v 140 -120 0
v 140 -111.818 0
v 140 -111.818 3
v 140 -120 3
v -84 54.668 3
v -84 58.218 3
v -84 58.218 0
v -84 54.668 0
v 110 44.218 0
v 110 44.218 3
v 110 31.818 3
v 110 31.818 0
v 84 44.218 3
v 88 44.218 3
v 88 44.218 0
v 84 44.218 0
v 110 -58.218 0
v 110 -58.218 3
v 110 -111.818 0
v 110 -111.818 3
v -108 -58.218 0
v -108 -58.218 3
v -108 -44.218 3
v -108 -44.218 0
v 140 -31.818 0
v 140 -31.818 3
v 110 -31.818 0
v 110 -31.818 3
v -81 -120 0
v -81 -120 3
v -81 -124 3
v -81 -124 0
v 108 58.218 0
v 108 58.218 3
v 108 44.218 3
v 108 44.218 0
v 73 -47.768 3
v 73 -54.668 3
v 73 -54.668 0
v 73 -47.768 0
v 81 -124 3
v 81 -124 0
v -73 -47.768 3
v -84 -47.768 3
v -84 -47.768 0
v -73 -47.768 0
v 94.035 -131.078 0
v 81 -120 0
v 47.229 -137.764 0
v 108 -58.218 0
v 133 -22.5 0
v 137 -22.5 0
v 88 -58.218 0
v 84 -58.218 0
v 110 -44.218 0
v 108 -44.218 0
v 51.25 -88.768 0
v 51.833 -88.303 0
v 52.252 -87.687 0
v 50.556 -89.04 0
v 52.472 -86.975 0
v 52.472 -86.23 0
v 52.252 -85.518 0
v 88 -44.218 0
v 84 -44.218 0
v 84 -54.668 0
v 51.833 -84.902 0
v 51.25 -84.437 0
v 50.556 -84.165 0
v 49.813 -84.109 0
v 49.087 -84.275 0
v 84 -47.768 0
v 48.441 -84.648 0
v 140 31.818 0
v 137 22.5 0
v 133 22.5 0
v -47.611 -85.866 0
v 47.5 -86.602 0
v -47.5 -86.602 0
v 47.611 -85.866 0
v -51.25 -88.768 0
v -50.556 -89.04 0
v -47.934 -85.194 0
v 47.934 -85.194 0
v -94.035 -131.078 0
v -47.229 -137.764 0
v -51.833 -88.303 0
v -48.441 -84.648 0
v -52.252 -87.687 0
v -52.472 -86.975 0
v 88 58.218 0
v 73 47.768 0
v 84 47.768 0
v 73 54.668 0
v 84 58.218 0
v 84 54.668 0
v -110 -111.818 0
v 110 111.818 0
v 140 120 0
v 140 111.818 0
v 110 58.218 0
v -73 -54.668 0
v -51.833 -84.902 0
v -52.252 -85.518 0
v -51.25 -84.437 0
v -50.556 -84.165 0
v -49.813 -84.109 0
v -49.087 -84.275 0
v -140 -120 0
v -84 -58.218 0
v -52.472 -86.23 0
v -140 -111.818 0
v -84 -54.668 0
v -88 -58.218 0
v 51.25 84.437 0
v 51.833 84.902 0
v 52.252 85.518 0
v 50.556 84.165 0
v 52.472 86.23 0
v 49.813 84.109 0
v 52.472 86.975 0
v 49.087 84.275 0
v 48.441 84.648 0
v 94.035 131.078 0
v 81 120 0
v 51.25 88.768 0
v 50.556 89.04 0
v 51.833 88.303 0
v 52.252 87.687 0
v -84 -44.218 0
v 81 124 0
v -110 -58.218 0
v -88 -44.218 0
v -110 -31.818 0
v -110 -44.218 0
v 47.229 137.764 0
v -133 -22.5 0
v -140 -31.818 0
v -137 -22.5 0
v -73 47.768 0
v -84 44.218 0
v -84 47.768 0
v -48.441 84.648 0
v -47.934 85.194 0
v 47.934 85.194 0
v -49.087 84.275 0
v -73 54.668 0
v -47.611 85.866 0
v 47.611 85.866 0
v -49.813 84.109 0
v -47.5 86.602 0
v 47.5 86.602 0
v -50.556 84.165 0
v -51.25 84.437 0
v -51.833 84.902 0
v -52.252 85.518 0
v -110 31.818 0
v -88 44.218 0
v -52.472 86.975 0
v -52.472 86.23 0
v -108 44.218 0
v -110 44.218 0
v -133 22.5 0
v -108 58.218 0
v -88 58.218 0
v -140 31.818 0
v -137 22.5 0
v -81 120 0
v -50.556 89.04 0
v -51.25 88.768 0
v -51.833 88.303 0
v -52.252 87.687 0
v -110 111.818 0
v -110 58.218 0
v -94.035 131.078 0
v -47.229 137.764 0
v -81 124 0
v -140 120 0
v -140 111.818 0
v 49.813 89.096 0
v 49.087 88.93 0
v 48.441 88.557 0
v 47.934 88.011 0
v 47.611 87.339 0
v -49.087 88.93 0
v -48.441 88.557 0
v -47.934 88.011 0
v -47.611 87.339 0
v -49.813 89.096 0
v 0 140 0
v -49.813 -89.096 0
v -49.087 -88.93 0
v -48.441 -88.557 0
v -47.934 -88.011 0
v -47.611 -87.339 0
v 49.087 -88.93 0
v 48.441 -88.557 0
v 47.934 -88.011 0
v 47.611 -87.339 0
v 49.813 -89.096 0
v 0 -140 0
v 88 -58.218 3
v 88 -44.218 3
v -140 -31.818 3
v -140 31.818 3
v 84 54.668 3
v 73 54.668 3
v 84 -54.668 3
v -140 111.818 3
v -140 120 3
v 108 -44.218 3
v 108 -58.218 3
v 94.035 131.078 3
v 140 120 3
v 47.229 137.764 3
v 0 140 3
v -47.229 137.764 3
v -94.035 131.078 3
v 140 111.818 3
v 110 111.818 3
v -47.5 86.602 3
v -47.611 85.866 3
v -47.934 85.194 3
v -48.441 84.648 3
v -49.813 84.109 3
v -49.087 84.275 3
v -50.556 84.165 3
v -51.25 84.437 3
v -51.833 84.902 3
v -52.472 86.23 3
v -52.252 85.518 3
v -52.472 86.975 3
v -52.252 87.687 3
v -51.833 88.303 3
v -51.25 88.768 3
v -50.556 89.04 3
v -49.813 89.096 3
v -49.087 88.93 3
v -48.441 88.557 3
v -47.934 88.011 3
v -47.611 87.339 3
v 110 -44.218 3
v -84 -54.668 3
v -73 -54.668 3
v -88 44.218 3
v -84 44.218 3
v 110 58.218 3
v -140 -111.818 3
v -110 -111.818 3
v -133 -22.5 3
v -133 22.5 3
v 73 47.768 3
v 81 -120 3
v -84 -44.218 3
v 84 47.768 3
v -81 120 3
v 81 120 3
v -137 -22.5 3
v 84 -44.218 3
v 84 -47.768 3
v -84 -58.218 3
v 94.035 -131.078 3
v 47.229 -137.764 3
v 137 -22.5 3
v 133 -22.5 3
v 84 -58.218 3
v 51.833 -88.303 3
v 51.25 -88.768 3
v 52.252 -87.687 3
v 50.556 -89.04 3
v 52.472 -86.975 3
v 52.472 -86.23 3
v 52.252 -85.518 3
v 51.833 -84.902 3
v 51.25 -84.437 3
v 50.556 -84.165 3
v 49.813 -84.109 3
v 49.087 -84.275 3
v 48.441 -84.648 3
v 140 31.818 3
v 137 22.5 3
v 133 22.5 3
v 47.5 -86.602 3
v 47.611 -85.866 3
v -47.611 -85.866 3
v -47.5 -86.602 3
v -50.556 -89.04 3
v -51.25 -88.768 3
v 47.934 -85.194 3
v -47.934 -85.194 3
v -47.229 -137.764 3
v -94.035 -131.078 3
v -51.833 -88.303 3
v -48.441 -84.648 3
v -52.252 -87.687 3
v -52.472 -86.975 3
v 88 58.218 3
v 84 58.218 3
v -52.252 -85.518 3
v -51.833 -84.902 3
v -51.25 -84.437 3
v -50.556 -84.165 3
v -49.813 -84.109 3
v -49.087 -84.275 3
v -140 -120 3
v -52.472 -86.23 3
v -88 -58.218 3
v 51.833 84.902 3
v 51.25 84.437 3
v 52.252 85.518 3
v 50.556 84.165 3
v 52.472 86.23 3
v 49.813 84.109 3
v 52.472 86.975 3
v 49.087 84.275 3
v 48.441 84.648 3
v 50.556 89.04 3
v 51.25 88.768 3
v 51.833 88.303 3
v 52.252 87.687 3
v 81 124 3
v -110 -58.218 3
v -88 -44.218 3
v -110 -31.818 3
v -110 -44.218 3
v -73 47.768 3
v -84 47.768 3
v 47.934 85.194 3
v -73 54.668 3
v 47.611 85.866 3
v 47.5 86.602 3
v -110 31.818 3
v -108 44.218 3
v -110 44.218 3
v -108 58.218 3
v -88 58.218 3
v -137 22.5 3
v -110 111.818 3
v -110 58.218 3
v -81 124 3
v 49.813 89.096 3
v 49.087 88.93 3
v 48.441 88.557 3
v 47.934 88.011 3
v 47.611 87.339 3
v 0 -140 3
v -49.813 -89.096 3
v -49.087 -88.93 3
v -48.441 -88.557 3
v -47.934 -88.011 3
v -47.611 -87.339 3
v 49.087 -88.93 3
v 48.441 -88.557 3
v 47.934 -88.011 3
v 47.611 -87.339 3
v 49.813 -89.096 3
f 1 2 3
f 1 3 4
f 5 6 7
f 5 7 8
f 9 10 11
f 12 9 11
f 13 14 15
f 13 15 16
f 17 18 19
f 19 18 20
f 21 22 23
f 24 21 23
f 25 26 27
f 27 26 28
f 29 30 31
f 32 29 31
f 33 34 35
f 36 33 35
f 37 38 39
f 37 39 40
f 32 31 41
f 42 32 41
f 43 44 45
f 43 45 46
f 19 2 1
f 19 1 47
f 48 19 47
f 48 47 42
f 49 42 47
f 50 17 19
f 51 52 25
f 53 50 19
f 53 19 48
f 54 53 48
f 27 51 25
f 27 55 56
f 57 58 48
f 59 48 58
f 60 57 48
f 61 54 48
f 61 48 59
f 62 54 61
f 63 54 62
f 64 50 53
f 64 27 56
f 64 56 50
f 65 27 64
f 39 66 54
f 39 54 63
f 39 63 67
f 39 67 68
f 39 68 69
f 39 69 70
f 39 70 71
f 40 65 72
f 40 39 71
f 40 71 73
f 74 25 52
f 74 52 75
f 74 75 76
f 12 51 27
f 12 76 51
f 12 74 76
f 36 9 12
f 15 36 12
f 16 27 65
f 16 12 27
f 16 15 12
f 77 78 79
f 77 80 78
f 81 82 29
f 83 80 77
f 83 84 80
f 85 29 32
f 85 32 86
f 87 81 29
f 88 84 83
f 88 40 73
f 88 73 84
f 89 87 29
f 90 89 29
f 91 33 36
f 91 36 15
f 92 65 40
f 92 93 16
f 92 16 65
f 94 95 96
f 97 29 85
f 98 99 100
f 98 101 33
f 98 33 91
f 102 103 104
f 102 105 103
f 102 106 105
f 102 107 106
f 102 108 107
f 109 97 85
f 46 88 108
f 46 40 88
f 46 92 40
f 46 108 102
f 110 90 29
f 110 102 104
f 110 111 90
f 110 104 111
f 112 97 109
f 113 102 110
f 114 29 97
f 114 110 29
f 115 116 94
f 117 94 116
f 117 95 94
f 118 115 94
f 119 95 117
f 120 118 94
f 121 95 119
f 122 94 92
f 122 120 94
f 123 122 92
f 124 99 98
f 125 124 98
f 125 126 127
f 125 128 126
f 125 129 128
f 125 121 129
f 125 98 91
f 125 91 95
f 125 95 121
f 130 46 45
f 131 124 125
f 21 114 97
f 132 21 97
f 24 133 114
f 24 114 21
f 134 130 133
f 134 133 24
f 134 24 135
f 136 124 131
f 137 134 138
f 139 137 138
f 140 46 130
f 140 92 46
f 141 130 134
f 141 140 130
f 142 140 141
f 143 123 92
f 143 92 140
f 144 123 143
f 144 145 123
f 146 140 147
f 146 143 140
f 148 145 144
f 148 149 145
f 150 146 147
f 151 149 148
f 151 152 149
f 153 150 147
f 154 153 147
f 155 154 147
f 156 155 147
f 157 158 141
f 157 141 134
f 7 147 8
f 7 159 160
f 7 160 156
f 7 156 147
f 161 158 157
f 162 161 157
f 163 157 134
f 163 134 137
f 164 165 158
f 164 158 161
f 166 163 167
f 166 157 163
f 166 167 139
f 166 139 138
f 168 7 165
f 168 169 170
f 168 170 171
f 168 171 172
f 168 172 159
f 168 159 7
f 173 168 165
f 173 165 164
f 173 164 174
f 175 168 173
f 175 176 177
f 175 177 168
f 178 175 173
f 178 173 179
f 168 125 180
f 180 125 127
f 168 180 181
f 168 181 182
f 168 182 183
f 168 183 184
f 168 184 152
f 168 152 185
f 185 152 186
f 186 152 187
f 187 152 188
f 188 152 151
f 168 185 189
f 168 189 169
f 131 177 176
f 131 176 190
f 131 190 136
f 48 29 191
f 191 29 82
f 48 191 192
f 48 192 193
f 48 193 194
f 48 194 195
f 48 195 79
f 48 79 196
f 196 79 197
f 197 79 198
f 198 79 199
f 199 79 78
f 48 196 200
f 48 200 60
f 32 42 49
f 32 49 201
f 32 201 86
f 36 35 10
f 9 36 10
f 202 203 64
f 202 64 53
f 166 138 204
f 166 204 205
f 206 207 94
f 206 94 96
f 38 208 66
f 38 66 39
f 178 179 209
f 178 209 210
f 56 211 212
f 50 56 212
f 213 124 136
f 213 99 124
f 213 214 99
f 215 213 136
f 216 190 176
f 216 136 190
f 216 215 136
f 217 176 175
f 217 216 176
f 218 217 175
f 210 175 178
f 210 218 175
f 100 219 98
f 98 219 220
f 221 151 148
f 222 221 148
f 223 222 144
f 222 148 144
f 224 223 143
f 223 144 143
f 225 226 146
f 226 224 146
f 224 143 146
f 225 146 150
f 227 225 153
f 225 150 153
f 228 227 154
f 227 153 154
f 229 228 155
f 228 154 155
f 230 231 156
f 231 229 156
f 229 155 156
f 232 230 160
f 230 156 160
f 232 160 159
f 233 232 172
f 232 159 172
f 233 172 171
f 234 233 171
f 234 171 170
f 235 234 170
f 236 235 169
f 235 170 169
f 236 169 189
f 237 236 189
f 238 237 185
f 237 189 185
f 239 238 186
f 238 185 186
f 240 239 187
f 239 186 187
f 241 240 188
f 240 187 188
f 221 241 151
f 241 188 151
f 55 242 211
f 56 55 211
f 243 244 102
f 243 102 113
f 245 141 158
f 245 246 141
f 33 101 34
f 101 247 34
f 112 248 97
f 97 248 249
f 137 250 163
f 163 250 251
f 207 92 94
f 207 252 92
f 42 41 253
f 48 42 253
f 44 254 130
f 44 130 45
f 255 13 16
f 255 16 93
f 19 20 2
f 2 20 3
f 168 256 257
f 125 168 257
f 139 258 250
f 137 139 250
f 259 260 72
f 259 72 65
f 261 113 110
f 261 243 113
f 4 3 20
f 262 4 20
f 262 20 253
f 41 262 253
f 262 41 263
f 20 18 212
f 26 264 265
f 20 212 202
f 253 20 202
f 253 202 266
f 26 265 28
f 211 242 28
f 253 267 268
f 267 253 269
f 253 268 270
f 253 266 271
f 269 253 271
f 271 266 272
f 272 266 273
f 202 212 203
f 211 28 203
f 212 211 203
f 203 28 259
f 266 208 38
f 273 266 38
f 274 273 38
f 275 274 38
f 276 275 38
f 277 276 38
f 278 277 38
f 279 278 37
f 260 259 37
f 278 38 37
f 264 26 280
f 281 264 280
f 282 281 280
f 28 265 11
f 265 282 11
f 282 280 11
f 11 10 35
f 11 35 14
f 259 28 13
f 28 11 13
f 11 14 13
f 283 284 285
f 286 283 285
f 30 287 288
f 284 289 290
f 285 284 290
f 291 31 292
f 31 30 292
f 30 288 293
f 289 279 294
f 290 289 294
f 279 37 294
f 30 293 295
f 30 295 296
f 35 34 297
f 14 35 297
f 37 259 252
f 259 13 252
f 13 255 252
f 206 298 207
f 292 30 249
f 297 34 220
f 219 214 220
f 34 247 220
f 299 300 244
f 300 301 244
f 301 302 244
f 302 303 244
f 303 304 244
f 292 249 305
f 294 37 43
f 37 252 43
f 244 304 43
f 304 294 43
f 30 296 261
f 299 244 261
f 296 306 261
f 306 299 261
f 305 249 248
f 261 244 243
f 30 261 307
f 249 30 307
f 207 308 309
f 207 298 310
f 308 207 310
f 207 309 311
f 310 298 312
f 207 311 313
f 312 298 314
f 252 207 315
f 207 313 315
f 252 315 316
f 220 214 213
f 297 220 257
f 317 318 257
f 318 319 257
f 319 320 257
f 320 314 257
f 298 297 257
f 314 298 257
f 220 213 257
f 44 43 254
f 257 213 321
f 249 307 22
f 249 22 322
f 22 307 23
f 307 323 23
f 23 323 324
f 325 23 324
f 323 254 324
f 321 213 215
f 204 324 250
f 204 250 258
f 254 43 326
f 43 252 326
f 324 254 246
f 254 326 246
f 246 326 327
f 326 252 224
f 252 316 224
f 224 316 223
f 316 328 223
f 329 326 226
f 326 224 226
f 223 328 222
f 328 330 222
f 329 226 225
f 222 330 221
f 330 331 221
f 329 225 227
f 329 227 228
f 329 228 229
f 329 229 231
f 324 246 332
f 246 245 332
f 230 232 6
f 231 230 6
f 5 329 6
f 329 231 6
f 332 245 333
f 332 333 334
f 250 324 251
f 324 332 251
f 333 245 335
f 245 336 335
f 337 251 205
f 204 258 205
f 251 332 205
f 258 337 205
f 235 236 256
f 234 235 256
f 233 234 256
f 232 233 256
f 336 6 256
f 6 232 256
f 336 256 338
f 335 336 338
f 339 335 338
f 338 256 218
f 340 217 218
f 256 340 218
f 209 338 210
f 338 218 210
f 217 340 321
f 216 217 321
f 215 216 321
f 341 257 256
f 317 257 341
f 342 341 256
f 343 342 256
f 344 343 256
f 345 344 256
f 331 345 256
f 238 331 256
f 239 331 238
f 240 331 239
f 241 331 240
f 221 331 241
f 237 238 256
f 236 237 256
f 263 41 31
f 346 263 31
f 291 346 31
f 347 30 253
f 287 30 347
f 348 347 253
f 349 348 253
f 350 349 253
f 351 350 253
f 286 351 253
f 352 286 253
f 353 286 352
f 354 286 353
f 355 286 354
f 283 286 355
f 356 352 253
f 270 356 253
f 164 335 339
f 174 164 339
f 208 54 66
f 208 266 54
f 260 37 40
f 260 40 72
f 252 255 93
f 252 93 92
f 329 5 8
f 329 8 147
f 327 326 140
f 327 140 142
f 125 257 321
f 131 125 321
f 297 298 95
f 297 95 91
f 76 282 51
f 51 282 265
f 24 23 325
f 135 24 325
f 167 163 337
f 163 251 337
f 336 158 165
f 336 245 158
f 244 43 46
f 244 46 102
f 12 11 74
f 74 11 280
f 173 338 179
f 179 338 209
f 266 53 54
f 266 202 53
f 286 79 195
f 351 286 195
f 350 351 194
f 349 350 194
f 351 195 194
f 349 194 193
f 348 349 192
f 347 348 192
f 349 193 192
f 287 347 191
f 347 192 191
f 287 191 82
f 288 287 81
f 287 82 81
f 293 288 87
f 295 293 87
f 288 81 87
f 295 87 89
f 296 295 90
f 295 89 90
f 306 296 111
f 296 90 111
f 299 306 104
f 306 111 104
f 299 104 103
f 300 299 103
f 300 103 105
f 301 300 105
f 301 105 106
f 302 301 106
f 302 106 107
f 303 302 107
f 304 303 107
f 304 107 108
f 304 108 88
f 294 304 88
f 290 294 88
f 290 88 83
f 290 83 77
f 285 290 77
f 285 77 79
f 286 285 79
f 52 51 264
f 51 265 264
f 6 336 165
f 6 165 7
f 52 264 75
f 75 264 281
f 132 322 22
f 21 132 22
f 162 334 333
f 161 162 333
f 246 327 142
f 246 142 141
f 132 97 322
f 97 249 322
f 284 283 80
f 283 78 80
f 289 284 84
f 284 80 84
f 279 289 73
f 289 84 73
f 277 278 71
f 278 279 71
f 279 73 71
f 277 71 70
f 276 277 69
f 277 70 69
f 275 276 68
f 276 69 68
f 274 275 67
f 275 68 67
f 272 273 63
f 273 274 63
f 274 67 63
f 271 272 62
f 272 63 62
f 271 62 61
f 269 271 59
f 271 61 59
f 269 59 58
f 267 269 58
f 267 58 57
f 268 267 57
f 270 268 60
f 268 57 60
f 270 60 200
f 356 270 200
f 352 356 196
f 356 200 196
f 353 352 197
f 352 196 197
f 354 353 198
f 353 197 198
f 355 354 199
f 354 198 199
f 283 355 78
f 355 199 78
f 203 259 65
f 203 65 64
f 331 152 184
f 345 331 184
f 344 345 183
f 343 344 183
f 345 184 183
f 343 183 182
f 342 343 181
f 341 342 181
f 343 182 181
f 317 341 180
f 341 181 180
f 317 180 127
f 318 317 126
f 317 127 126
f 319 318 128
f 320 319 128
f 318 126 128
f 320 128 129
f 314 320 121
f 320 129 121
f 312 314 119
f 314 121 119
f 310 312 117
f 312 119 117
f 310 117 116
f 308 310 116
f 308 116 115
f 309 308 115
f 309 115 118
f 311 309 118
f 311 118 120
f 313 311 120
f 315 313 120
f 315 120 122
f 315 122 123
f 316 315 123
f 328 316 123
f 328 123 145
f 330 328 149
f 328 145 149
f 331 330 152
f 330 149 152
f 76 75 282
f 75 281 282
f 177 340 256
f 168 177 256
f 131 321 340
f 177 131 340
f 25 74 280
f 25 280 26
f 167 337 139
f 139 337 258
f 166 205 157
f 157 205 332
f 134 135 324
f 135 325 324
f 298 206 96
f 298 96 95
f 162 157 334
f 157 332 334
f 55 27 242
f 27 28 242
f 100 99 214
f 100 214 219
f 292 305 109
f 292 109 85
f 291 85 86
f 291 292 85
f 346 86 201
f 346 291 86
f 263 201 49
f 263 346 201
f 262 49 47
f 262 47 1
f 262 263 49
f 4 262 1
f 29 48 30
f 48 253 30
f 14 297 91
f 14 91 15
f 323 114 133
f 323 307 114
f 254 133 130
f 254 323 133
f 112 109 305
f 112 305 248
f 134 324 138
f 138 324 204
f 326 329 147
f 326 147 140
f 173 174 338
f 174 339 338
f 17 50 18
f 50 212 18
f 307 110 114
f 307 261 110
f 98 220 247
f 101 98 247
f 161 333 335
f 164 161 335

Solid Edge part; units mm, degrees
sketch "Sketch1" plane through (0, 0, 0) normal (0, 0, 1) x (1, 0, 0)
  line L0 (0, 0) -> (-140, 0)
  line L1 (-140, 0) -> (-140, 140)
  line L2 (-140, 140) -> (0, 140)
  line L3 (0, 140) -> (0, 0)
  circle A0 centre (-50, 86.6025) radius 2.5
  dimension "D1" = 280
  dimension "D2" = 280
  dimension "D3" = 70
  dimension "D4" = 5
  dimension "D5" = 100
extrude "Ajout_matière_1" add sketch "Sketch1" along normal blind 3
sketch "Sketch2" plane through (-70, 70, 3) normal (0, 0, 1) x (1, 0, 0)
  line L0 (-70, -38.1818) -> (-40, -38.1818)
  line L1 (-40, -38.1818) -> (-40, 41.8182)
  line L2 (-40, 41.8182) -> (-70, 41.8182)
  line L3 (-70, 41.8182) -> (-70, -38.1818)
  dimension "D1" = 30
  dimension "D2" = 80
  dimension "D3" = 31.8182
extrude "Cutout1" cut sketch "Sketch2" against normal through all
sketch "Sketch3" plane through (-70, 70, 3) normal (0, 0, 1) x (1, 0, 0)
  line L0 (70, 70) -> (-70, 70)
  line L1 (-70, 70) -> (-70, 50)
  arc A0 (-70, 50) -> (70, 70) centre (70, -430) cw
  dimension "D1" = 20
  dimension "D2" = 500
extrude "Cutout2" cut sketch "Sketch3" against normal through all
mirror "Mirror1" about plane through (0, 0, 0) normal (1, 0, 0) of "Ajout_matière_1", "Cutout1", "Cutout2"
mirror "Mirror2" about plane through (0, 0, 0) normal (0, -1, 0) of "Ajout_matière_1", "Cutout1", "Cutout2", "Mirror1"
sketch "Sketch4" plane through (0, 0, 3) normal (0, 0, 1) x (1, 0, 0)
  line L0 (-112, 44.2182) -> (-108, 44.2182)
  line L1 (-108, 44.2182) -> (-108, 58.2182)
  line L2 (-108, 58.2182) -> (-112, 58.2182)
  line L3 (-112, 58.2182) -> (-112, 44.2182)
  line L4 (-88, 58.2182) -> (-84, 58.2182)
  line L5 (-84, 58.2182) -> (-84, 54.6682)
  line L6 (-84, 54.6682) -> (-73, 54.6682)
  line L7 (-73, 54.6682) -> (-73, 47.7682)
  line L8 (-73, 47.7682) -> (-84, 47.7682)
  line L9 (-84, 47.7682) -> (-84, 44.2182)
  line L10 (-84, 44.2182) -> (-88, 44.2182)
  line L11 (-88, 44.2182) -> (-88, 58.2182)
  dimension "D1" = 14
  dimension "D2" = 4
  dimension "D3" = 20.6
  dimension "D4" = 2
  dimension "D5" = 4
  dimension "D6" = 6.9
  dimension "D7" = 14
  dimension "D8" = 20
  dimension "D9" = 4
  dimension "D10" = 11
extrude "Cutout9" cut sketch "Sketch4" against normal through all
mirror "Mirror3" about plane through (0, 0, 0) normal (1, 0, 0) of "Cutout9"
mirror "Mirror4" about plane through (0, 0, 0) normal (0, -1, 0) of "Cutout9", "Mirror3"
sketch "Sketch5" plane through (0, 0, 3) normal (0, 0, 1) x (0, 1, 0)
  line L0 (22.5, 137) -> (-22.5, 137)
  line L1 (-22.5, 137) -> (-22.5, 133)
  line L2 (-22.5, 133) -> (22.5, 133)
  line L3 (22.5, 133) -> (22.5, 137)
  dimension "D1" = 4
  dimension "D2" = 45
  dimension "D3" = 133
extrude "Cutout13" cut sketch "Sketch5" against normal through all
mirror "Mirror5" about plane through (0, 0, 0) normal (1, 0, 0) of "Cutout13"
sketch "Sketch6" plane through (0, 0, 3) normal (0, 0, 1) x (0, 1, 0)
  line L0 (124, 81) -> (120, 81)
  line L1 (120, 81) -> (120, -81)
  line L2 (120, -81) -> (124, -81)
  line L3 (124, -81) -> (124, 81)
  dimension "D1" = 4
  dimension "D2" = 162
  dimension "D3" = 120
extrude "Cutout15" cut sketch "Sketch6" against normal through all
mirror "Mirror6" about plane through (0, 0, 0) normal (0, -1, 0) of "Cutout15"
properties material "Acier S235"
